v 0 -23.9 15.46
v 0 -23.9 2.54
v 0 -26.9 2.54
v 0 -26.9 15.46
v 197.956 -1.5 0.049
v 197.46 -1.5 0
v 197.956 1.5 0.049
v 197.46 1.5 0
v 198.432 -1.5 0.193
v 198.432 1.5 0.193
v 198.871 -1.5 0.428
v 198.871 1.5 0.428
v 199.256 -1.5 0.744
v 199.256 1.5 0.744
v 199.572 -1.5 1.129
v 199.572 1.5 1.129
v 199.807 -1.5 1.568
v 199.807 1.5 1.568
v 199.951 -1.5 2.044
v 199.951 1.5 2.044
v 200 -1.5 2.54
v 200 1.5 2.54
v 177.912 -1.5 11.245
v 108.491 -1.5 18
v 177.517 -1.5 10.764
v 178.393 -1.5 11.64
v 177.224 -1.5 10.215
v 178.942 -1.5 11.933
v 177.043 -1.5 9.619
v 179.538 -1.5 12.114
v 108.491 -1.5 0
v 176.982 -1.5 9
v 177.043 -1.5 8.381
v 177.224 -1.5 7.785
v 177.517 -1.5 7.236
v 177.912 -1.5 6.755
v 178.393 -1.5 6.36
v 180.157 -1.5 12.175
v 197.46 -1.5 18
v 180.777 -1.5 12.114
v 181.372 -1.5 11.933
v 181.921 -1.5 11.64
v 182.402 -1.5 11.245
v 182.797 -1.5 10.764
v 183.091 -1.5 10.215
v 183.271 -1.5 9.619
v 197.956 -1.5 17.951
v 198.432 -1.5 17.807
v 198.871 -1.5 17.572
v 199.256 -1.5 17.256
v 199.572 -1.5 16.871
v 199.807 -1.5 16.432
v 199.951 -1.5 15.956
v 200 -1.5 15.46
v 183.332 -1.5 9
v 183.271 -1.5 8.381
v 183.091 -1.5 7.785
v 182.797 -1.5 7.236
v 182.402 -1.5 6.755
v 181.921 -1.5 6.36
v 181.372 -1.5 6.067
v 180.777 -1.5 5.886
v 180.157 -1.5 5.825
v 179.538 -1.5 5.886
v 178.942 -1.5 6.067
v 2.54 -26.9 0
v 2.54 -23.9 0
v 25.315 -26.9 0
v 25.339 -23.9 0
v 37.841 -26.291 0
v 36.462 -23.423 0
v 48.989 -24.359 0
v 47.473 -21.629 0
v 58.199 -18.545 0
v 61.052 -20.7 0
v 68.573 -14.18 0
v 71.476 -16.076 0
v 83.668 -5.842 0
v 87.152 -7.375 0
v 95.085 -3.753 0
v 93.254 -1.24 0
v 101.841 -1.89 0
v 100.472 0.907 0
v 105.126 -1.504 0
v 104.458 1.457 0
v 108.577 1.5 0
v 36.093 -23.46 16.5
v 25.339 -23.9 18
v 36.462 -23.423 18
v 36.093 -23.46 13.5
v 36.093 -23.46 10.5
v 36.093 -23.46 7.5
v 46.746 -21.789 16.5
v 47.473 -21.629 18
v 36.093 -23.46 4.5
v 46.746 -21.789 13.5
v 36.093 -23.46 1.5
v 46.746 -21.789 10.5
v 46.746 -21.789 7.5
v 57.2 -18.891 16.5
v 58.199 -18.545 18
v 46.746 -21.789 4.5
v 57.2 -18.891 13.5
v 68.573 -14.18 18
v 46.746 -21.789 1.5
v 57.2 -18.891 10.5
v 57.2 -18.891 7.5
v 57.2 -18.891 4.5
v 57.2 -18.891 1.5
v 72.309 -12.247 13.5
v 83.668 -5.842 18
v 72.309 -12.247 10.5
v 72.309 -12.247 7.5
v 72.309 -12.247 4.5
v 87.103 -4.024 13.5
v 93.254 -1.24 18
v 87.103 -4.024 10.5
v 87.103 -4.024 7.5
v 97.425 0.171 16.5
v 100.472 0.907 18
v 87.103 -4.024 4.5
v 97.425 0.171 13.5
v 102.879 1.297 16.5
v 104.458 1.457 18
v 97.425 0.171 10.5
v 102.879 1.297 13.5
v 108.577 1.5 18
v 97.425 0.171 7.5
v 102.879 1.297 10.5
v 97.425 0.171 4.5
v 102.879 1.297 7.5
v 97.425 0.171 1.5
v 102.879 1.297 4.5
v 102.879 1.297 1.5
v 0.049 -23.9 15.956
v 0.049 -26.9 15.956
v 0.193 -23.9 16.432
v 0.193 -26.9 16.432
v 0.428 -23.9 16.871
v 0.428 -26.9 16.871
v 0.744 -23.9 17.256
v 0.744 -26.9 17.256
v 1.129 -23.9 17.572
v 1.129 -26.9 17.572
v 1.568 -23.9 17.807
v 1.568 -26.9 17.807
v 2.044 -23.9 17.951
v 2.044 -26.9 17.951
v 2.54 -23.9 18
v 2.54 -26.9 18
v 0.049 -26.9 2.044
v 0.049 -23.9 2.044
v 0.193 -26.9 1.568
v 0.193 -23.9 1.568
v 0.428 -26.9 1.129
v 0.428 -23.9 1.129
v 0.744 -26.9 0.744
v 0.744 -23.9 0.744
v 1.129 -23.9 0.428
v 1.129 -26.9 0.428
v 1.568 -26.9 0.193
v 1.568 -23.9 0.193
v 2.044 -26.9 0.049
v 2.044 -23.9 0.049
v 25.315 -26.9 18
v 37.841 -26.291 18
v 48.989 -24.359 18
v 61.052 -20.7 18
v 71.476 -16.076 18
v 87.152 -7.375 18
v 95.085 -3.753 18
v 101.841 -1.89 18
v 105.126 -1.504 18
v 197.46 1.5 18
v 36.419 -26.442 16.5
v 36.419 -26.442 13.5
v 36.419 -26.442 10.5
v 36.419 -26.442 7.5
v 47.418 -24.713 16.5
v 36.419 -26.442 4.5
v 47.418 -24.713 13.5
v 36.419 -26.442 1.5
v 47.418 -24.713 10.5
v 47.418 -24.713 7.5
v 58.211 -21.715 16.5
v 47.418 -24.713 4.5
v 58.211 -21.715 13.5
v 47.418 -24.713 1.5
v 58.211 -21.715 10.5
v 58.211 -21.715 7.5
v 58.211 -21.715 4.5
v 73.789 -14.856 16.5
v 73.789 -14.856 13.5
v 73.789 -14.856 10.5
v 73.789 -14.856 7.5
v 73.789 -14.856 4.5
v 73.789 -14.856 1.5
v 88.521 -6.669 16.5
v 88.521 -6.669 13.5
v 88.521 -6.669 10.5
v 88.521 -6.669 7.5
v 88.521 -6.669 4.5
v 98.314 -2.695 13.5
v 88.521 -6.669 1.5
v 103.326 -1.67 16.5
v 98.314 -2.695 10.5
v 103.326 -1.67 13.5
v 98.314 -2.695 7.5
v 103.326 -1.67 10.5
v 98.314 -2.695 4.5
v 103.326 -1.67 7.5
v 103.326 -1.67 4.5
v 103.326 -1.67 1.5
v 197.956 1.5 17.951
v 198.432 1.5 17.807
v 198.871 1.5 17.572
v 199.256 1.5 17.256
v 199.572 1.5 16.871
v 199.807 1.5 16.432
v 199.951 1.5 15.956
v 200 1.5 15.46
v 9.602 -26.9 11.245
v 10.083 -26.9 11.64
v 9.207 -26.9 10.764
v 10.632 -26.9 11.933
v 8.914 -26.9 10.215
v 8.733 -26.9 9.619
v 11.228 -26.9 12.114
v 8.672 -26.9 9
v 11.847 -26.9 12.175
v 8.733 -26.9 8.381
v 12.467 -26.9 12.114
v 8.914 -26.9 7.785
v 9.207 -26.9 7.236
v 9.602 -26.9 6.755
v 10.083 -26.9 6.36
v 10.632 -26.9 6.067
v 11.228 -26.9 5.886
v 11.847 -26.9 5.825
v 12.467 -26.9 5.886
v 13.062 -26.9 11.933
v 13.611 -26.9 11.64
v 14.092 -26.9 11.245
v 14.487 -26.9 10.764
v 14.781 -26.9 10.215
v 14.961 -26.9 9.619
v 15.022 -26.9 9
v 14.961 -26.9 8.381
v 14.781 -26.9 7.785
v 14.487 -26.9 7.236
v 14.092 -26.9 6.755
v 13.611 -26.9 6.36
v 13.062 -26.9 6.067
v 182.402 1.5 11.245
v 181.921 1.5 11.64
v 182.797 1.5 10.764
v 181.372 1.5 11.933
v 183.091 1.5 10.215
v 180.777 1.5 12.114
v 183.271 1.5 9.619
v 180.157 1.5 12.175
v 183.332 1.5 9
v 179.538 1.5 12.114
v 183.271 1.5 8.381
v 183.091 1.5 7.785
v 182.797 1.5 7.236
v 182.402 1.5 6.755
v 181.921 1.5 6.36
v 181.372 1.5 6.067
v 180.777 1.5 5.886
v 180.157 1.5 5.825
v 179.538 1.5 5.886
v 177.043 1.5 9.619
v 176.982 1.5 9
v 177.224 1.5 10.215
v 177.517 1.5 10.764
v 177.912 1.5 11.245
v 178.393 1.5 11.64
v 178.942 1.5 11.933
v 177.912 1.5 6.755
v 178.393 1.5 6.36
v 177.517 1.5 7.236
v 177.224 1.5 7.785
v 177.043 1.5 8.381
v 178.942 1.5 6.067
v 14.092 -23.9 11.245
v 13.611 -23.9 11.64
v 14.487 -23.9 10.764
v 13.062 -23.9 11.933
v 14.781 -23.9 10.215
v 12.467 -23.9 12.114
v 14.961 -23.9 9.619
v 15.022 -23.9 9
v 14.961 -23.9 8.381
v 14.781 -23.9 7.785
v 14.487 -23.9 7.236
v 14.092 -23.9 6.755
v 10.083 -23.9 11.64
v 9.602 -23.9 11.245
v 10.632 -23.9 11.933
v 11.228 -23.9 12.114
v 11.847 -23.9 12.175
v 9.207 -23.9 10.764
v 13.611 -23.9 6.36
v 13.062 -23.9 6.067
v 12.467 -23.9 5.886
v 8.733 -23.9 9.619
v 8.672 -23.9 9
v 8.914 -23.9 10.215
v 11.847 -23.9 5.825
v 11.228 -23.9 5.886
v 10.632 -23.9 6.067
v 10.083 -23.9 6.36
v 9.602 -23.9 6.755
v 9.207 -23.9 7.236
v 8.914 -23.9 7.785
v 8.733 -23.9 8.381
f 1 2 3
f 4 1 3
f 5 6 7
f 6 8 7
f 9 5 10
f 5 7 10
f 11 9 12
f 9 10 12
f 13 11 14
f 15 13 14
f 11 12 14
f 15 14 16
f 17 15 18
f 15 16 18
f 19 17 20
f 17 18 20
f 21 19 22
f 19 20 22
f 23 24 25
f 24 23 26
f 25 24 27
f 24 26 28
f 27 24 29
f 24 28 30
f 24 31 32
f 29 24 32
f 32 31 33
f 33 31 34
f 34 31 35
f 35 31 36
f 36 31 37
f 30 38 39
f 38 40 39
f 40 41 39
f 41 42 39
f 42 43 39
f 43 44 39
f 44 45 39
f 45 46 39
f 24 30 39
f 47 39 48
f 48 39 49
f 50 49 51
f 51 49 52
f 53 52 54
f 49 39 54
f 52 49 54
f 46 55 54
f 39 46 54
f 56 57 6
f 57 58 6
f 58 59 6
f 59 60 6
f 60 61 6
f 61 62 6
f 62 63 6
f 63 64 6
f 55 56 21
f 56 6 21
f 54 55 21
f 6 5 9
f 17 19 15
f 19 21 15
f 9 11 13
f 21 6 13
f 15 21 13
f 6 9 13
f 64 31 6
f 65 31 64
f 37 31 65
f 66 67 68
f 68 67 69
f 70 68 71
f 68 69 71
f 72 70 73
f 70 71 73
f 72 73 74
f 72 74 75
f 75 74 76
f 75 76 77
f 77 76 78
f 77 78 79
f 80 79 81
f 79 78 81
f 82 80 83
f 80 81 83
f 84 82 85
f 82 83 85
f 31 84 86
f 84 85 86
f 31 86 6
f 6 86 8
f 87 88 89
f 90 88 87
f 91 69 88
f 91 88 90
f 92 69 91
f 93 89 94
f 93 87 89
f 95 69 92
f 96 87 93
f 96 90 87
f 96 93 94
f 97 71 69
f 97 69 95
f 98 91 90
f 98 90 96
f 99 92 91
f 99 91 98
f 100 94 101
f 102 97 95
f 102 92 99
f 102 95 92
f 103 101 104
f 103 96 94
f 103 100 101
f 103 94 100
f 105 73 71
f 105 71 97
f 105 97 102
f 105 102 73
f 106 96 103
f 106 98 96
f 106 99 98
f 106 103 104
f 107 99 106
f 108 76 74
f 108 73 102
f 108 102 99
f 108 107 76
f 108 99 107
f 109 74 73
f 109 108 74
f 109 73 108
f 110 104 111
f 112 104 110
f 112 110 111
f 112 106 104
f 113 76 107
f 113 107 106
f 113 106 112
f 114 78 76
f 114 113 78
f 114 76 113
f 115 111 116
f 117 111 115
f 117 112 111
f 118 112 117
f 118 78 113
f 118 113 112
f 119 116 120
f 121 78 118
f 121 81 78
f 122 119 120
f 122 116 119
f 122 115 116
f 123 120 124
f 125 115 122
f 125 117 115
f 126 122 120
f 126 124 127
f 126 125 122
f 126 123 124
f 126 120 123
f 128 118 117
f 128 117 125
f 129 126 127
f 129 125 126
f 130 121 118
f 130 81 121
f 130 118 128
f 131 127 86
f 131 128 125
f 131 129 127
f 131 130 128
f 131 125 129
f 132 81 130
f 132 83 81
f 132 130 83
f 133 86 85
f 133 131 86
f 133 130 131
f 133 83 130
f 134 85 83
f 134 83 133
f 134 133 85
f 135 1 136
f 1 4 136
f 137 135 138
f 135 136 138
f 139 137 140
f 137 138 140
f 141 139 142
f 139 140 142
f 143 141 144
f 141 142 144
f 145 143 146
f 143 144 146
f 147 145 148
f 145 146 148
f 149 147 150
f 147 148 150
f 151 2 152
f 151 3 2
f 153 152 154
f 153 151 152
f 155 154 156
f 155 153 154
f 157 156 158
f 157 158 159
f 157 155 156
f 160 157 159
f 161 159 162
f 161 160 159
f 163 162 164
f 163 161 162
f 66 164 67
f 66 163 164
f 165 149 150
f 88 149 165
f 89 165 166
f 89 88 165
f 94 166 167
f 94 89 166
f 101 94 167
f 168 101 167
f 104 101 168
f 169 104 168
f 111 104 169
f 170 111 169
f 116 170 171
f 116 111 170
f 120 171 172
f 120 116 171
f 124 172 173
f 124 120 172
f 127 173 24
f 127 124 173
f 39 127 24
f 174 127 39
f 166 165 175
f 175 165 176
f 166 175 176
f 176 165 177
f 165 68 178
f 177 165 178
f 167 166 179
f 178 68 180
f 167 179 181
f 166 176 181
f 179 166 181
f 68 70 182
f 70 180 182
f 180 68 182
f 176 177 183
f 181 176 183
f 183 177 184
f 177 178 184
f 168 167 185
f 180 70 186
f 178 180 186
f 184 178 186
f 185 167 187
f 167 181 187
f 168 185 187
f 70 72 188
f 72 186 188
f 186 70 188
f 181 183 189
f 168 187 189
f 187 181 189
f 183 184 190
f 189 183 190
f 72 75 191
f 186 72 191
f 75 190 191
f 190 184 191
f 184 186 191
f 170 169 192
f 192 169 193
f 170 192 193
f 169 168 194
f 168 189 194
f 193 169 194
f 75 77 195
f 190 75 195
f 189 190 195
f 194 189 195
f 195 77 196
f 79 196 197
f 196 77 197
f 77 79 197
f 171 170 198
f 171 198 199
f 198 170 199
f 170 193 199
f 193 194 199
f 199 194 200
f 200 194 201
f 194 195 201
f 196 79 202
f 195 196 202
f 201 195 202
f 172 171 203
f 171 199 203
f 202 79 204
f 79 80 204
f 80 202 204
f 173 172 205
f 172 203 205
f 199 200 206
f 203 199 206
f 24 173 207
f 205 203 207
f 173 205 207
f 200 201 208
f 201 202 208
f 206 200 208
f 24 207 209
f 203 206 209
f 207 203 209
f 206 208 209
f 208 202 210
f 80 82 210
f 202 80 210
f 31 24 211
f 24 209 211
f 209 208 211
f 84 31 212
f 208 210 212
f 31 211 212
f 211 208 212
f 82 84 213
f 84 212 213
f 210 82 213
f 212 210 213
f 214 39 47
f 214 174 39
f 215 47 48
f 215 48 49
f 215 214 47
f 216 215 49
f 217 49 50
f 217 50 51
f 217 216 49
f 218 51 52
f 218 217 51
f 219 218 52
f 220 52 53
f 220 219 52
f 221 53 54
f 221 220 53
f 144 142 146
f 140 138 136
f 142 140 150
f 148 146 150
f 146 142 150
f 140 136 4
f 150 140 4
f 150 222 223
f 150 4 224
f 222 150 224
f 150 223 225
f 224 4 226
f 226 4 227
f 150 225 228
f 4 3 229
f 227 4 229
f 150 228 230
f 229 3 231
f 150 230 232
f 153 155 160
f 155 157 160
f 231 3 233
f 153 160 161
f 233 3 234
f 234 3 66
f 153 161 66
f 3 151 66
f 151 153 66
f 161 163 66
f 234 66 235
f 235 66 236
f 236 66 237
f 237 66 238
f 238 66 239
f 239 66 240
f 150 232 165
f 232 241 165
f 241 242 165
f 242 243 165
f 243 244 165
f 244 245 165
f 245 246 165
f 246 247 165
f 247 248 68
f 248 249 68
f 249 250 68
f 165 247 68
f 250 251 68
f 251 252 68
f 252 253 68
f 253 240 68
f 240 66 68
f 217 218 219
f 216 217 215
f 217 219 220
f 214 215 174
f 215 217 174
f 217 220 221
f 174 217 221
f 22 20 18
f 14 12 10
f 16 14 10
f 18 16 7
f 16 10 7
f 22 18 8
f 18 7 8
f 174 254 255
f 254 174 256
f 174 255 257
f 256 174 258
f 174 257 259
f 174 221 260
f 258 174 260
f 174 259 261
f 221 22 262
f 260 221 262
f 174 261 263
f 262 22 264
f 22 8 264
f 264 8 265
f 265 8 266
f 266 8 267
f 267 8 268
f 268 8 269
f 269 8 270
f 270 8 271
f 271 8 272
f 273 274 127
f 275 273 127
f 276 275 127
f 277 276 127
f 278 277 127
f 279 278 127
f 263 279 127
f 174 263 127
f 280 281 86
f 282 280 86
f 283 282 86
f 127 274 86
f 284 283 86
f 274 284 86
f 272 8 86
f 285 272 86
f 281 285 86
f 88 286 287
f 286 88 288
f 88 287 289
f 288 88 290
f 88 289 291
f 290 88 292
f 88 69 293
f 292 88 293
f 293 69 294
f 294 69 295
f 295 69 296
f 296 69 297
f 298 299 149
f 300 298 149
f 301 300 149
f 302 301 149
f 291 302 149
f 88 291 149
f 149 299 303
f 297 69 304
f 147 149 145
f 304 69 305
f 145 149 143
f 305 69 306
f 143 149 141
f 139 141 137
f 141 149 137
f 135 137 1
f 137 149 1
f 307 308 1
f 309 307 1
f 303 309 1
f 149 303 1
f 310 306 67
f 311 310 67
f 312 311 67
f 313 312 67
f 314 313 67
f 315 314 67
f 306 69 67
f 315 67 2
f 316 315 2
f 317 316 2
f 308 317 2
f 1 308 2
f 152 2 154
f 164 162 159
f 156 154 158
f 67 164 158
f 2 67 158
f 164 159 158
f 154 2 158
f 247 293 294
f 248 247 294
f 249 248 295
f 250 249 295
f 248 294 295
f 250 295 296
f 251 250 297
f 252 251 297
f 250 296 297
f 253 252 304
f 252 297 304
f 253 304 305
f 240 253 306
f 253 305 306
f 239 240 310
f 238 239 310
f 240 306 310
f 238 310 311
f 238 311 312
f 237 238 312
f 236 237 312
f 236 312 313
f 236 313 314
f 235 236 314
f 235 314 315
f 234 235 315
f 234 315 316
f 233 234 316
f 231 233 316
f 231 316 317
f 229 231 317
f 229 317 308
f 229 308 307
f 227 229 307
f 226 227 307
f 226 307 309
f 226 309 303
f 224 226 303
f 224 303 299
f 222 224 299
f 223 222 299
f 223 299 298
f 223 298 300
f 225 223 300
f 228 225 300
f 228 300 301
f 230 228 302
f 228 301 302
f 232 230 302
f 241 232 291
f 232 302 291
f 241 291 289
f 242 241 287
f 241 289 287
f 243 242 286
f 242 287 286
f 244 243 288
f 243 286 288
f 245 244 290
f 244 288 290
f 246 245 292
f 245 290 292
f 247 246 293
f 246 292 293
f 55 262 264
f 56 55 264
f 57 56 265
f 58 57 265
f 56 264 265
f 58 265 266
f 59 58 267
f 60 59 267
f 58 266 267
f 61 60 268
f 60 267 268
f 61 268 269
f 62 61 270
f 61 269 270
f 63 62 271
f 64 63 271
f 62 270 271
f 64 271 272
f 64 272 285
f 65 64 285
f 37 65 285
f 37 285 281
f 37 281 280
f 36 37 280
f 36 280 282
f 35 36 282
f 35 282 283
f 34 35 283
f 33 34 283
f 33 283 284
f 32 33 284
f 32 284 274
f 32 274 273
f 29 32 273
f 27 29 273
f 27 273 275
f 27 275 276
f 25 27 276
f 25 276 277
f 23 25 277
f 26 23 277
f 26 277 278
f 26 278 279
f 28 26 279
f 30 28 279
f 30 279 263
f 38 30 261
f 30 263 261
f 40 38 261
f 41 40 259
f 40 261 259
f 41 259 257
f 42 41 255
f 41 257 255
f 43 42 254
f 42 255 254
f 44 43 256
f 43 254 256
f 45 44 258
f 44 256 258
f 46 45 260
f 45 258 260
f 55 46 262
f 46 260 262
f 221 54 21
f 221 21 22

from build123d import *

# Parameters (mm, degrees)
BOSS_EXTRUDE1_DEPTH     = 18
SKETCH2_R               = 3.175
CUT_EXTRUDE1_DEPTH      = 1.048172096
CUT_EXTRUDE1_DEPTH_BACK = 29.412494693
FILLET1_R               = 2.54


with BuildPart() as part:
    # Sketch1 → Boss-Extrude1 (new body)
    with BuildSketch(Plane.XY):
        with BuildLine():
            Line((0, -26.9), (25.314659544, -26.9))
            add(Edge.make_bspline(
                [(25.314659544, -26.9), (29.018808902, -26.95946599), (36.438320652, -26.653818936), (47.452273732, -24.92488313), (58.262486614, -21.924318782), (67.016013602, -18.37965694), (73.811742851, -14.890308818), (80.427413207, -11.130302547), (86.897235914, -7.369109823), (93.386399422, -4.327041649), (98.298472606, -2.578666278), (102.47088341, -1.703494583), (105.870866673, -1.428331861), (107.623577227, -1.449984583), (108.491279544, -1.5)],
                knots=[0.000136912, 0.000136912, 0.000136912, 0.000136912, 0.125180551, 0.250224189, 0.375267828, 0.500311467, 0.562833286, 0.625355105, 0.750398744, 0.812920563, 0.875442382, 0.937964202, 0.969225111, 1.000486021, 1.000486021, 1.000486021, 1.000486021], degree=3))
            Line((108.491279544, -1.5), (200, -1.5))
            Line((200, -1.5), (200, 1.5))
            Line((200, 1.5), (108.577128094, 1.5))
            add(Edge.make_bspline(
                [(25.338879667, -23.9), (28.926162088, -23.958039606), (36.111765907, -23.664827946), (46.778323763, -21.99406658), (57.248447209, -19.093410872), (65.732493814, -15.662477543), (72.314760278, -12.28848554), (78.848846724, -8.579093587), (85.394977085, -4.766737379), (92.155894885, -1.585137398), (97.388130608, 0.290112445), (101.932358434, 1.257689935), (105.679869219, 1.570192395), (107.61823033, 1.553901023), (108.577128094, 1.5)],
                knots=[-0.00013852, -0.00013852, -0.00013852, -0.00013852, 0.124820277, 0.249779073, 0.37473787, 0.499696666, 0.562176065, 0.624655463, 0.749614259, 0.812093658, 0.874573056, 0.937052454, 0.968292153, 0.999531852, 0.999531852, 0.999531852, 0.999531852], degree=3))
            Line((25.338879667, -23.9), (0, -23.9))
            Line((0, -23.9), (0, -26.9))
        make_face()
    extrude(amount=BOSS_EXTRUDE1_DEPTH)

    # Sketch2 → Cut-Extrude1 (cut, two sides)
    with BuildSketch(Plane(origin=(0, 1.5, 0), x_dir=(1, 0, 0), z_dir=(0, 1, 0))) as cut_extrude1_sk:
        with Locations((11.847374462, -9)):
            Circle(SKETCH2_R)
        with Locations((180.157387408, -9)):
            Circle(SKETCH2_R)
    extrude(amount=CUT_EXTRUDE1_DEPTH, mode=Mode.SUBTRACT)
    extrude(cut_extrude1_sk.sketch, amount=-CUT_EXTRUDE1_DEPTH_BACK, mode=Mode.SUBTRACT)

    # Fillet1
    fillet1_edges = [part.edges().sort_by_distance(p)[0] for p in [
        (0, -25.4, 0),
        (200, 0, 18),
        (0, -25.4, 18),
        (200, 0, 0),
    ]]
    fillet(fillet1_edges, radius=FILLET1_R)


solid = part.part
